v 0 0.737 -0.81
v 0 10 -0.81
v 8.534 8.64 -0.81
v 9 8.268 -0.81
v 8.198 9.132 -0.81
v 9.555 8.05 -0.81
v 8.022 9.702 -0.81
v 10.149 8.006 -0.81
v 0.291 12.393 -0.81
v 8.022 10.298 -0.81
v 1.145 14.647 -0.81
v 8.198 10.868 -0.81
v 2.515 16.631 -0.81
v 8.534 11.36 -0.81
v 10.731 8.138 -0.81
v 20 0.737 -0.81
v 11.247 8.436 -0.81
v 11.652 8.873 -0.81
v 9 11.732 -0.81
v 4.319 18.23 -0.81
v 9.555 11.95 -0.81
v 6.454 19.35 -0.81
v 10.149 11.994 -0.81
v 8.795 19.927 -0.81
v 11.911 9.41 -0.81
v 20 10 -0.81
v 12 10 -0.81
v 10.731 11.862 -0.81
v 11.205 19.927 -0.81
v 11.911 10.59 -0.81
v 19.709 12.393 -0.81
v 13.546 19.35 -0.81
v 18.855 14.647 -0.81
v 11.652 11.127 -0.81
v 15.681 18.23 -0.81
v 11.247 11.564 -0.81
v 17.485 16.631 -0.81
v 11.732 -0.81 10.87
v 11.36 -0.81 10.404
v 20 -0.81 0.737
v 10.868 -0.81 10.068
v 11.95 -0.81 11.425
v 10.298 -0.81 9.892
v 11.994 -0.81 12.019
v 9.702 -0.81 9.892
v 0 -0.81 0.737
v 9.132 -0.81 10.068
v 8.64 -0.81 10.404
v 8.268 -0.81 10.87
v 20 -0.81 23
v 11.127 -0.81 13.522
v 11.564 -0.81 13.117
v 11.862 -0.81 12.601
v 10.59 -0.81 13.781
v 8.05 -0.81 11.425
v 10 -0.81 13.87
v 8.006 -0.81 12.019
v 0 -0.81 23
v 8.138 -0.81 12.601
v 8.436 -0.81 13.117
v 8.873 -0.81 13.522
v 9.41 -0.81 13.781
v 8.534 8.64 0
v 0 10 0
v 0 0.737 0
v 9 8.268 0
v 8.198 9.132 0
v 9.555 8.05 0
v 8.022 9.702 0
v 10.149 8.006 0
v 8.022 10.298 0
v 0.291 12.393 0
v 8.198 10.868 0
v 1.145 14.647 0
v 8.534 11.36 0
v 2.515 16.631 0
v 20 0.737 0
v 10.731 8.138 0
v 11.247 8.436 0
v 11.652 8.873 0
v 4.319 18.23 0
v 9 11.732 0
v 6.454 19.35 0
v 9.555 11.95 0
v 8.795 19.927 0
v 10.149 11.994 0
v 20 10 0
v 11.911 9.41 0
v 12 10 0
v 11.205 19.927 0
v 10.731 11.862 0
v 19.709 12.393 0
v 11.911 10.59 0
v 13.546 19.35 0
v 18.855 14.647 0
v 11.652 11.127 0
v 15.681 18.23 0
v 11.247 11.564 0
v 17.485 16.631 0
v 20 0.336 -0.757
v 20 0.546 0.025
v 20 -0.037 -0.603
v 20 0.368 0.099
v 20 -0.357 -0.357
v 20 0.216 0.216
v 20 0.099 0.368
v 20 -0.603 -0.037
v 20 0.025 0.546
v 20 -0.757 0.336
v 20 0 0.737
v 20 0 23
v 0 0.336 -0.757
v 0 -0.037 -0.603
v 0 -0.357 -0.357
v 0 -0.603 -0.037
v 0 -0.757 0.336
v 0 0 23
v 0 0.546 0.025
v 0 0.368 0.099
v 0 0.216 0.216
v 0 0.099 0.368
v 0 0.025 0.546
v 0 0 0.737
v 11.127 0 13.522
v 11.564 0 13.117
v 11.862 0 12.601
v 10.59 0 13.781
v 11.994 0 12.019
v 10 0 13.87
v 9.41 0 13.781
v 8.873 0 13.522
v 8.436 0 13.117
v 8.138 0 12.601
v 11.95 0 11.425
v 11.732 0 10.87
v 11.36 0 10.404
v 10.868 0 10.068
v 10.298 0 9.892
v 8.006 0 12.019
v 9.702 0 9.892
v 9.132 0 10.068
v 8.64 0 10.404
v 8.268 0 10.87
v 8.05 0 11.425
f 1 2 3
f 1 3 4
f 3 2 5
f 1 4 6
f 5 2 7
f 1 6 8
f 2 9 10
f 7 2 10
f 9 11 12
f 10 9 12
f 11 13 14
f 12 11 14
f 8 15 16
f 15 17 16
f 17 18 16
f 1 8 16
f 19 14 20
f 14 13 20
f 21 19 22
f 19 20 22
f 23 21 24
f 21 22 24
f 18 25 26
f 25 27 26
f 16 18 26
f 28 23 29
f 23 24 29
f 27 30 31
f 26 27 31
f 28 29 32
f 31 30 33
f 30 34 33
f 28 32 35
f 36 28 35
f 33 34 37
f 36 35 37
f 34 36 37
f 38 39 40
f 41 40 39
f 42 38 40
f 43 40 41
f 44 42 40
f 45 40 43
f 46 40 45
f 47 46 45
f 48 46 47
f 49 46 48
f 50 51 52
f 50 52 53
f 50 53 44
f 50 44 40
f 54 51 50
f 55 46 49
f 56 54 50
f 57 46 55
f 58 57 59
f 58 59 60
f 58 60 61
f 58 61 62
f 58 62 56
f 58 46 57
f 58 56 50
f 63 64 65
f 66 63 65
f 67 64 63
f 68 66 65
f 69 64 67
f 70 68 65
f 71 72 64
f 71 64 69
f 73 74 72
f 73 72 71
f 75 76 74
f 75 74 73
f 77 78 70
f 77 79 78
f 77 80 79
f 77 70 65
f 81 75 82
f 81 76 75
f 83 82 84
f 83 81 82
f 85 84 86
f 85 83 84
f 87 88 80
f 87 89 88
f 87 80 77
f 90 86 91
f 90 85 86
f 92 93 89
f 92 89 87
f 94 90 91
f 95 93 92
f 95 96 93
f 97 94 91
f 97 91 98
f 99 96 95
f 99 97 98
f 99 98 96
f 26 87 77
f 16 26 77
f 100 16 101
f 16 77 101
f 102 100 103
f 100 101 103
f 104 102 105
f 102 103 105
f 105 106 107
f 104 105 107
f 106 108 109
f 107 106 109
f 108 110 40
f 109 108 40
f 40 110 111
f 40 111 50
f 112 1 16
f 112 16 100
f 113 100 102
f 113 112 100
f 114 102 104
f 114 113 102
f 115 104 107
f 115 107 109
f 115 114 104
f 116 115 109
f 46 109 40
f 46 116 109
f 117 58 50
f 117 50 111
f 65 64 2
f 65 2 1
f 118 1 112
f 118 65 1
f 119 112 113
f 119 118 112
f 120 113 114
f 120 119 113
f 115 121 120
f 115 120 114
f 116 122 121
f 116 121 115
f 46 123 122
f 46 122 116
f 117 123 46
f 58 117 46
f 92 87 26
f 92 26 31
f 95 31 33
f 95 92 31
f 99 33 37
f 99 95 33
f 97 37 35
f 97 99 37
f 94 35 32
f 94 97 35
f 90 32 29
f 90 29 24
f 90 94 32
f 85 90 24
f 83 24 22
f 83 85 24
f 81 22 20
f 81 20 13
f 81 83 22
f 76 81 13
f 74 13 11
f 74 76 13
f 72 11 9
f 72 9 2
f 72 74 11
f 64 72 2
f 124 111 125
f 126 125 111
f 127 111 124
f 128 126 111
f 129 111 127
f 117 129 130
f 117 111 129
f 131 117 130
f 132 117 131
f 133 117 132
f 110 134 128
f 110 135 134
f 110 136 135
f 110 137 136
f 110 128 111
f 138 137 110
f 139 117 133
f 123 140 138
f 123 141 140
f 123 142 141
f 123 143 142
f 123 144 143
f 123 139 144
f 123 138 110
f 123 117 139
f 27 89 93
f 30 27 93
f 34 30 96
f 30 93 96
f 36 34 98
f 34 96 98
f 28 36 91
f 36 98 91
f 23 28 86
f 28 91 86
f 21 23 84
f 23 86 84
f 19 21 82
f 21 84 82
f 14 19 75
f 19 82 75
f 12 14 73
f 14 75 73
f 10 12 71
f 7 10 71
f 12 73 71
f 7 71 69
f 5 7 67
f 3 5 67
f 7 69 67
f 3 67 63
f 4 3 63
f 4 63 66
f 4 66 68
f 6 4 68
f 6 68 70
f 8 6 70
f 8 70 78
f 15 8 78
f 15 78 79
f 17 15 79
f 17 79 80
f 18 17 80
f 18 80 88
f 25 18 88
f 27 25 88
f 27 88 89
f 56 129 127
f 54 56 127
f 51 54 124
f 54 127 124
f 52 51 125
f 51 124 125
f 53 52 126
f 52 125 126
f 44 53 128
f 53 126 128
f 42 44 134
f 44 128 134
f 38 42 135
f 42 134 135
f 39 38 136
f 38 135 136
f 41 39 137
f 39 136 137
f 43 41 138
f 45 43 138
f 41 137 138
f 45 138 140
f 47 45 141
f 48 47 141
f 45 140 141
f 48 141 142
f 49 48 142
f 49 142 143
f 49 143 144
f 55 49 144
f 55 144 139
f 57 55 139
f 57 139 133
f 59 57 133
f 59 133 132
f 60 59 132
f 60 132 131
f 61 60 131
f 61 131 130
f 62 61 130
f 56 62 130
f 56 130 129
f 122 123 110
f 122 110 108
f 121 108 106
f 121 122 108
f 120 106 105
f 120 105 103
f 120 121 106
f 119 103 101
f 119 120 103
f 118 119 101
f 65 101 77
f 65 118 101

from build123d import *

# Parameters (mm, degrees)
BASE_FLANGE1_DEPTH           = 0.81
EDGE_FLANGE1_STRIP_W         = 4.7132
EDGE_FLANGE1_STRIP_H         = 0.81
EDGE_FLANGE1_STRIP_CUT_DEPTH = 20
EDGE_FLANGE1_DEPTH           = 20
CUT_EXTRUDE1_REACH           = 38.455
SKETCH9_R                    = 2
CUT_EXTRUDE2_REACH           = 38.455
SKETCH10_R                   = 2


# Sheet-metal steps are written as plain solids
with BuildPart() as part:
    # Sketch1 → Base-Flange1 (new body)
    with BuildSketch(Plane.XY):
        with BuildLine():
            Line((0, 0), (20, 0))
            Line((20, 0), (20, 10))
            ThreePointArc((20, 10), (10, 20), (0, 10))
            Line((0, 10), (0, 0))
        make_face()
    extrude(amount=-BASE_FLANGE1_DEPTH)

    # Edge-Flange1 strip (across the edge) → Edge-Flange1 strip cut (cut)
    with BuildSketch(Plane.YZ):
        with Locations((-1.62, -0.405)):
            Rectangle(EDGE_FLANGE1_STRIP_W, EDGE_FLANGE1_STRIP_H)
    extrude(amount=EDGE_FLANGE1_STRIP_CUT_DEPTH, mode=Mode.SUBTRACT)

    # Edge-Flange1 section (across the edge) → Edge-Flange1 (add)
    with BuildSketch(Plane.YZ):
        with BuildLine():
            Line((-0.81, 0.7366), (-0.81, 23))
            Line((-0.81, 23), (0, 23))
            Line((0, 23), (0, 0.7366))
            ThreePointArc((0, 0.7366), (0.215745145, 0.215745145), (0.7366, 0))
            Line((0.7366, 0), (0.7366, -0.81))
            ThreePointArc((0.7366, -0.81), (-0.357011348, -0.357011348), (-0.81, 0.7366))
        make_face()
    extrude(amount=EDGE_FLANGE1_DEPTH)

    # Sketch9 → Cut-Extrude1 (cut, up to next)
    with BuildSketch(Plane.XY, mode=Mode.PRIVATE) as cut_extrude1_sk1:
        with Locations((10, 10)):
            Circle(SKETCH9_R)
    cut_extrude1_tool1 = extrude(cut_extrude1_sk1.sketch, amount=-CUT_EXTRUDE1_REACH, mode=Mode.PRIVATE) & part.part
    add(cut_extrude1_tool1.solids().sort_by_distance((10, 10, 0))[0], mode=Mode.SUBTRACT)

    # Sketch10 → Cut-Extrude2 (cut, up to next)
    with BuildSketch(Plane(origin=(0, 0, 0), x_dir=(1, 0, 0), z_dir=(0, 1, 0)), mode=Mode.PRIVATE) as cut_extrude2_sk1:
        with Locations(Location((10, -11.87, 0), (0, 0, 270))):
            Circle(SKETCH10_R)
    cut_extrude2_tool1 = extrude(cut_extrude2_sk1.sketch, amount=-CUT_EXTRUDE2_REACH, mode=Mode.PRIVATE) & part.part
    add(cut_extrude2_tool1.solids().sort_by_distance((10, 0, 11.87))[0], mode=Mode.SUBTRACT)


solid = part.part
